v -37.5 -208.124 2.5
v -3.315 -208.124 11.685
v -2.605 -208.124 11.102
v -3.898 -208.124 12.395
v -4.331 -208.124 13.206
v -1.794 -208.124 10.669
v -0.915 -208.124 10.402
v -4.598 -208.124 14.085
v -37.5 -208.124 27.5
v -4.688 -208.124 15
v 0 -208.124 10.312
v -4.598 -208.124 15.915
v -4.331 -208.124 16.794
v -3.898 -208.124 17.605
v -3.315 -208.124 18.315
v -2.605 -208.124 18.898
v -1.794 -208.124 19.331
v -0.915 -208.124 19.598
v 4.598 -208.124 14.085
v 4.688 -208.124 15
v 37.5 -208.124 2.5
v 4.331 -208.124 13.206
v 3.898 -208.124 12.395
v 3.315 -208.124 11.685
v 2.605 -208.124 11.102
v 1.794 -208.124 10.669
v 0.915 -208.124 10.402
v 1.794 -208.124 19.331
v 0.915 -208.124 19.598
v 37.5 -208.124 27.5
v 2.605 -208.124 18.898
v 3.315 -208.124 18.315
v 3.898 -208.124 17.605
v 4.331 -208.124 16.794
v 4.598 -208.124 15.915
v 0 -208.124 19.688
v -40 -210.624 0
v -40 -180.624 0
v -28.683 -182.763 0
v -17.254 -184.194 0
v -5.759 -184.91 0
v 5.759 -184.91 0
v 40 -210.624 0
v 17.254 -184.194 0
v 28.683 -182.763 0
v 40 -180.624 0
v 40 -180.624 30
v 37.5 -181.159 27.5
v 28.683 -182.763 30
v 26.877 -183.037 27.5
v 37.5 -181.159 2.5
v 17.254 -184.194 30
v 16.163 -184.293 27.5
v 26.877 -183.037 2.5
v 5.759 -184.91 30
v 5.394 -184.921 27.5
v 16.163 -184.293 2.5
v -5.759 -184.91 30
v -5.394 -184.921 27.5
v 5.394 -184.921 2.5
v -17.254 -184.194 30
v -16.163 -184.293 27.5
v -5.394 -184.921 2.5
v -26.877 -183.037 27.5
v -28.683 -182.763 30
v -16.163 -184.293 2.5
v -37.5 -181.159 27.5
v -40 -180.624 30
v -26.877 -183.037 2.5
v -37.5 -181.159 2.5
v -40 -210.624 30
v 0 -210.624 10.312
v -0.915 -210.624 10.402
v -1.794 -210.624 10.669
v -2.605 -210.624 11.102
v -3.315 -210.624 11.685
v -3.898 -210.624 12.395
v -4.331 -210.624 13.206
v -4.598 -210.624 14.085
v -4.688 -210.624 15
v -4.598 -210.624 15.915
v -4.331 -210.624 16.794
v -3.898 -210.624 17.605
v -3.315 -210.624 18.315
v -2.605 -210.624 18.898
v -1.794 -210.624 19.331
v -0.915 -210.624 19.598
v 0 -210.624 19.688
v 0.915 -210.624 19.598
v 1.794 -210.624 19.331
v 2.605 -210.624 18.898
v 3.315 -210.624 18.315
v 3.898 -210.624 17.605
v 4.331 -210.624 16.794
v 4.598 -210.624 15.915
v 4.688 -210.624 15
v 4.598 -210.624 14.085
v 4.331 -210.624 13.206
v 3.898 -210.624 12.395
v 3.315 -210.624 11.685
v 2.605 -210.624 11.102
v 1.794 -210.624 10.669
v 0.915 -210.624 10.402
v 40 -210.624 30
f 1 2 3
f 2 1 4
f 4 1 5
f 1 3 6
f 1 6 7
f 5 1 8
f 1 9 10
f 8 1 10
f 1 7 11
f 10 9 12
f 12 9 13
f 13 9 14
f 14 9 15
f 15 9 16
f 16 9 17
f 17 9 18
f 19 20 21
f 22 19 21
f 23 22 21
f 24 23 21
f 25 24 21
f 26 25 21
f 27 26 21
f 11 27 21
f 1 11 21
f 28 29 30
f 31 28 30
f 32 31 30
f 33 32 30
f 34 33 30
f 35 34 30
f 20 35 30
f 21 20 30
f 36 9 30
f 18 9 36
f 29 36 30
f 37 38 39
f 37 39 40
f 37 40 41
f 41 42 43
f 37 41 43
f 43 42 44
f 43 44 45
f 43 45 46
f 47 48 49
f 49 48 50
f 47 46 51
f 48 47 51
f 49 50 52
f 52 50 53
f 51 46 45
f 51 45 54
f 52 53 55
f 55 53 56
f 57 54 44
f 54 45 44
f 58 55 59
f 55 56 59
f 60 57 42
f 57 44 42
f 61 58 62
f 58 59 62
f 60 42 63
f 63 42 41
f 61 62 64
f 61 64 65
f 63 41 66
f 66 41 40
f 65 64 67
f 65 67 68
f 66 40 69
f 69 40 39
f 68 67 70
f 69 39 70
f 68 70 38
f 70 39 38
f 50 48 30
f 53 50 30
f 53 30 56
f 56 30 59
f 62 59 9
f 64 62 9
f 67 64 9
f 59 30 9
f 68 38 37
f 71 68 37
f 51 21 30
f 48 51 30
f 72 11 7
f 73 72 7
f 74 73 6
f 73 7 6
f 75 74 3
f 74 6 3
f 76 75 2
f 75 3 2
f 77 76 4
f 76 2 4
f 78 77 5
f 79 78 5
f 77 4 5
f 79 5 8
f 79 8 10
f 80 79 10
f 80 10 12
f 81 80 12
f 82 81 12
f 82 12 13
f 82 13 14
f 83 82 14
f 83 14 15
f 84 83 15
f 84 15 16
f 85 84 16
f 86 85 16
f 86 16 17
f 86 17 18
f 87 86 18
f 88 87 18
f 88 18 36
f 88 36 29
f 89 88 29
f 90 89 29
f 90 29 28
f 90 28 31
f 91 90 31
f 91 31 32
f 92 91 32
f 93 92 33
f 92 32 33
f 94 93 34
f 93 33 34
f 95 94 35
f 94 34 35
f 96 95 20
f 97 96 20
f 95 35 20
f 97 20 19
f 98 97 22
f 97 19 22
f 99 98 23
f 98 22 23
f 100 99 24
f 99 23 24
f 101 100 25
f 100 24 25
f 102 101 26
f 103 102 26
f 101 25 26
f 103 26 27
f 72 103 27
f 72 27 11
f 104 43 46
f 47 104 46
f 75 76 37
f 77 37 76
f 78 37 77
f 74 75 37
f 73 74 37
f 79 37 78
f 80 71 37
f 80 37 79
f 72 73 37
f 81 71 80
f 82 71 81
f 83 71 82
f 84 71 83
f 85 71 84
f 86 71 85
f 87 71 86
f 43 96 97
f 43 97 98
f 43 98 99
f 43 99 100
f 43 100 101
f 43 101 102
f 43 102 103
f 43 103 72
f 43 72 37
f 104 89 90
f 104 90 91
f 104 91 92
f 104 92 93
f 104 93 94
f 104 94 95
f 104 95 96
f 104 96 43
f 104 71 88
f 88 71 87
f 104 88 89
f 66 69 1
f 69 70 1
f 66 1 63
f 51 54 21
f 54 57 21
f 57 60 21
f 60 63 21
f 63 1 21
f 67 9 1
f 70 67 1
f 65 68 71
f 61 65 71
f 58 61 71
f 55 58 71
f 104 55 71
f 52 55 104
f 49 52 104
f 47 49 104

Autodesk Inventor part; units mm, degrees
ref_plane "YZ Plane" through (0, 0, 0) normal (1, 0, 0) x (0, 1, 0)
ref_plane "XZ Plane" through (0, 0, 0) normal (0, 1, 0) x (-1, 0, 0)
ref_plane "XY Plane" through (0, 0, 0) normal (0, 0, 1) x (1, 0, 0)
sketch "Skizze1" plane through (0, 0, 0) normal (0, 0, 1) x (1, 0, 0)
  line L0 (-259, 0) -> (259, 0) projected
  line L1 (0, -289.7487) -> (0, 264.1248) projected
  circle A0 centre (0, 0) radius 185
  line L2 (-40, -180.6239) -> (40, -180.6239)
  line L3 (-40, -180.6239) -> (-40, -210.6239)
  line L4 (-40, -210.6239) -> (40, -210.6239)
  line L5 (40, -210.6239) -> (40, -180.6239)
  point P0 (0, -180.6239)
  dimension "d0" = 370
  dimension "d1" = 80
  dimension "d2" = 40
  dimension "d3" = 0
  dimension "d4" = 30
extrude "Extrusion1" add sketch "Skizze1" along normal blind 30 contours A0 L1 L4 L3 | A0 L5 L4 L1
sketch "Skizze2" plane through (-40, -210.6239, 0) normal (0, -1, 0) x (1, 0, 0)
  point P0 (40, 0)
sketch "Skizze3" plane through (-40, -210.6239, 0) normal (0, -1, 0) x (1, 0, 0)
  line L0 (2.5, 2.5) -> (77.5, 2.5)
  line L1 (77.5, 2.5) -> (77.5, 27.5)
  line L2 (77.5, 27.5) -> (2.5, 27.5)
  line L3 (2.5, 27.5) -> (2.5, 2.5)
  line L4 (0, 0) -> (0, 30) projected
  line L5 (0, 0) -> (80, 0) projected
  line L6 (0, 30) -> (80, 30) projected
  line L7 (80, 0) -> (80, 30) projected
  point P0 (40, 0)
  dimension "d7" = 2.5
  dimension "d8" = 2.5
  dimension "d9" = 2.5
  dimension "d10" = 2.5
extrude "Extrusion2" cut sketch "Skizze3" against normal blind 30 contours L3 L2 L1 L0
sketch "Skizze4" plane through (-40, -210.6239, 0) normal (0, -1, 0) x (1, 0, 0)
  line L0 (2.5, 27.5) -> (2.5, 2.5) projected
  line L1 (77.5, 27.5) -> (77.5, 2.5) projected
  line L2 (2.5, 2.5) -> (77.5, 2.5)
  line L3 (77.5, 2.5) -> (77.5, 27.5)
  line L4 (77.5, 27.5) -> (2.5, 27.5)
  line L5 (2.5, 27.5) -> (2.5, 2.5)
  point P0 (40, 0)
extrude "Extrusion3" add sketch "Skizze4" against normal blind 2.5
sketch "Skizze5" plane through (-40, -210.6239, 0) normal (0, -1, 0) x (1, 0, 0)
  line L0 (0, 0) -> (0, 30) projected
  point P0 (40, 0)
  point P1 (40, 15)
  dimension "d15" = 40
  dimension "d16" = 15
hole "Bohrung1" at (0, -210.6239, 15) direction (0, 1, 0) diameter 9.3762 end through all thread size "M11x1.5" class "6H" standard "ISO Metric profile"
properties part number "WasserAblauf1"
